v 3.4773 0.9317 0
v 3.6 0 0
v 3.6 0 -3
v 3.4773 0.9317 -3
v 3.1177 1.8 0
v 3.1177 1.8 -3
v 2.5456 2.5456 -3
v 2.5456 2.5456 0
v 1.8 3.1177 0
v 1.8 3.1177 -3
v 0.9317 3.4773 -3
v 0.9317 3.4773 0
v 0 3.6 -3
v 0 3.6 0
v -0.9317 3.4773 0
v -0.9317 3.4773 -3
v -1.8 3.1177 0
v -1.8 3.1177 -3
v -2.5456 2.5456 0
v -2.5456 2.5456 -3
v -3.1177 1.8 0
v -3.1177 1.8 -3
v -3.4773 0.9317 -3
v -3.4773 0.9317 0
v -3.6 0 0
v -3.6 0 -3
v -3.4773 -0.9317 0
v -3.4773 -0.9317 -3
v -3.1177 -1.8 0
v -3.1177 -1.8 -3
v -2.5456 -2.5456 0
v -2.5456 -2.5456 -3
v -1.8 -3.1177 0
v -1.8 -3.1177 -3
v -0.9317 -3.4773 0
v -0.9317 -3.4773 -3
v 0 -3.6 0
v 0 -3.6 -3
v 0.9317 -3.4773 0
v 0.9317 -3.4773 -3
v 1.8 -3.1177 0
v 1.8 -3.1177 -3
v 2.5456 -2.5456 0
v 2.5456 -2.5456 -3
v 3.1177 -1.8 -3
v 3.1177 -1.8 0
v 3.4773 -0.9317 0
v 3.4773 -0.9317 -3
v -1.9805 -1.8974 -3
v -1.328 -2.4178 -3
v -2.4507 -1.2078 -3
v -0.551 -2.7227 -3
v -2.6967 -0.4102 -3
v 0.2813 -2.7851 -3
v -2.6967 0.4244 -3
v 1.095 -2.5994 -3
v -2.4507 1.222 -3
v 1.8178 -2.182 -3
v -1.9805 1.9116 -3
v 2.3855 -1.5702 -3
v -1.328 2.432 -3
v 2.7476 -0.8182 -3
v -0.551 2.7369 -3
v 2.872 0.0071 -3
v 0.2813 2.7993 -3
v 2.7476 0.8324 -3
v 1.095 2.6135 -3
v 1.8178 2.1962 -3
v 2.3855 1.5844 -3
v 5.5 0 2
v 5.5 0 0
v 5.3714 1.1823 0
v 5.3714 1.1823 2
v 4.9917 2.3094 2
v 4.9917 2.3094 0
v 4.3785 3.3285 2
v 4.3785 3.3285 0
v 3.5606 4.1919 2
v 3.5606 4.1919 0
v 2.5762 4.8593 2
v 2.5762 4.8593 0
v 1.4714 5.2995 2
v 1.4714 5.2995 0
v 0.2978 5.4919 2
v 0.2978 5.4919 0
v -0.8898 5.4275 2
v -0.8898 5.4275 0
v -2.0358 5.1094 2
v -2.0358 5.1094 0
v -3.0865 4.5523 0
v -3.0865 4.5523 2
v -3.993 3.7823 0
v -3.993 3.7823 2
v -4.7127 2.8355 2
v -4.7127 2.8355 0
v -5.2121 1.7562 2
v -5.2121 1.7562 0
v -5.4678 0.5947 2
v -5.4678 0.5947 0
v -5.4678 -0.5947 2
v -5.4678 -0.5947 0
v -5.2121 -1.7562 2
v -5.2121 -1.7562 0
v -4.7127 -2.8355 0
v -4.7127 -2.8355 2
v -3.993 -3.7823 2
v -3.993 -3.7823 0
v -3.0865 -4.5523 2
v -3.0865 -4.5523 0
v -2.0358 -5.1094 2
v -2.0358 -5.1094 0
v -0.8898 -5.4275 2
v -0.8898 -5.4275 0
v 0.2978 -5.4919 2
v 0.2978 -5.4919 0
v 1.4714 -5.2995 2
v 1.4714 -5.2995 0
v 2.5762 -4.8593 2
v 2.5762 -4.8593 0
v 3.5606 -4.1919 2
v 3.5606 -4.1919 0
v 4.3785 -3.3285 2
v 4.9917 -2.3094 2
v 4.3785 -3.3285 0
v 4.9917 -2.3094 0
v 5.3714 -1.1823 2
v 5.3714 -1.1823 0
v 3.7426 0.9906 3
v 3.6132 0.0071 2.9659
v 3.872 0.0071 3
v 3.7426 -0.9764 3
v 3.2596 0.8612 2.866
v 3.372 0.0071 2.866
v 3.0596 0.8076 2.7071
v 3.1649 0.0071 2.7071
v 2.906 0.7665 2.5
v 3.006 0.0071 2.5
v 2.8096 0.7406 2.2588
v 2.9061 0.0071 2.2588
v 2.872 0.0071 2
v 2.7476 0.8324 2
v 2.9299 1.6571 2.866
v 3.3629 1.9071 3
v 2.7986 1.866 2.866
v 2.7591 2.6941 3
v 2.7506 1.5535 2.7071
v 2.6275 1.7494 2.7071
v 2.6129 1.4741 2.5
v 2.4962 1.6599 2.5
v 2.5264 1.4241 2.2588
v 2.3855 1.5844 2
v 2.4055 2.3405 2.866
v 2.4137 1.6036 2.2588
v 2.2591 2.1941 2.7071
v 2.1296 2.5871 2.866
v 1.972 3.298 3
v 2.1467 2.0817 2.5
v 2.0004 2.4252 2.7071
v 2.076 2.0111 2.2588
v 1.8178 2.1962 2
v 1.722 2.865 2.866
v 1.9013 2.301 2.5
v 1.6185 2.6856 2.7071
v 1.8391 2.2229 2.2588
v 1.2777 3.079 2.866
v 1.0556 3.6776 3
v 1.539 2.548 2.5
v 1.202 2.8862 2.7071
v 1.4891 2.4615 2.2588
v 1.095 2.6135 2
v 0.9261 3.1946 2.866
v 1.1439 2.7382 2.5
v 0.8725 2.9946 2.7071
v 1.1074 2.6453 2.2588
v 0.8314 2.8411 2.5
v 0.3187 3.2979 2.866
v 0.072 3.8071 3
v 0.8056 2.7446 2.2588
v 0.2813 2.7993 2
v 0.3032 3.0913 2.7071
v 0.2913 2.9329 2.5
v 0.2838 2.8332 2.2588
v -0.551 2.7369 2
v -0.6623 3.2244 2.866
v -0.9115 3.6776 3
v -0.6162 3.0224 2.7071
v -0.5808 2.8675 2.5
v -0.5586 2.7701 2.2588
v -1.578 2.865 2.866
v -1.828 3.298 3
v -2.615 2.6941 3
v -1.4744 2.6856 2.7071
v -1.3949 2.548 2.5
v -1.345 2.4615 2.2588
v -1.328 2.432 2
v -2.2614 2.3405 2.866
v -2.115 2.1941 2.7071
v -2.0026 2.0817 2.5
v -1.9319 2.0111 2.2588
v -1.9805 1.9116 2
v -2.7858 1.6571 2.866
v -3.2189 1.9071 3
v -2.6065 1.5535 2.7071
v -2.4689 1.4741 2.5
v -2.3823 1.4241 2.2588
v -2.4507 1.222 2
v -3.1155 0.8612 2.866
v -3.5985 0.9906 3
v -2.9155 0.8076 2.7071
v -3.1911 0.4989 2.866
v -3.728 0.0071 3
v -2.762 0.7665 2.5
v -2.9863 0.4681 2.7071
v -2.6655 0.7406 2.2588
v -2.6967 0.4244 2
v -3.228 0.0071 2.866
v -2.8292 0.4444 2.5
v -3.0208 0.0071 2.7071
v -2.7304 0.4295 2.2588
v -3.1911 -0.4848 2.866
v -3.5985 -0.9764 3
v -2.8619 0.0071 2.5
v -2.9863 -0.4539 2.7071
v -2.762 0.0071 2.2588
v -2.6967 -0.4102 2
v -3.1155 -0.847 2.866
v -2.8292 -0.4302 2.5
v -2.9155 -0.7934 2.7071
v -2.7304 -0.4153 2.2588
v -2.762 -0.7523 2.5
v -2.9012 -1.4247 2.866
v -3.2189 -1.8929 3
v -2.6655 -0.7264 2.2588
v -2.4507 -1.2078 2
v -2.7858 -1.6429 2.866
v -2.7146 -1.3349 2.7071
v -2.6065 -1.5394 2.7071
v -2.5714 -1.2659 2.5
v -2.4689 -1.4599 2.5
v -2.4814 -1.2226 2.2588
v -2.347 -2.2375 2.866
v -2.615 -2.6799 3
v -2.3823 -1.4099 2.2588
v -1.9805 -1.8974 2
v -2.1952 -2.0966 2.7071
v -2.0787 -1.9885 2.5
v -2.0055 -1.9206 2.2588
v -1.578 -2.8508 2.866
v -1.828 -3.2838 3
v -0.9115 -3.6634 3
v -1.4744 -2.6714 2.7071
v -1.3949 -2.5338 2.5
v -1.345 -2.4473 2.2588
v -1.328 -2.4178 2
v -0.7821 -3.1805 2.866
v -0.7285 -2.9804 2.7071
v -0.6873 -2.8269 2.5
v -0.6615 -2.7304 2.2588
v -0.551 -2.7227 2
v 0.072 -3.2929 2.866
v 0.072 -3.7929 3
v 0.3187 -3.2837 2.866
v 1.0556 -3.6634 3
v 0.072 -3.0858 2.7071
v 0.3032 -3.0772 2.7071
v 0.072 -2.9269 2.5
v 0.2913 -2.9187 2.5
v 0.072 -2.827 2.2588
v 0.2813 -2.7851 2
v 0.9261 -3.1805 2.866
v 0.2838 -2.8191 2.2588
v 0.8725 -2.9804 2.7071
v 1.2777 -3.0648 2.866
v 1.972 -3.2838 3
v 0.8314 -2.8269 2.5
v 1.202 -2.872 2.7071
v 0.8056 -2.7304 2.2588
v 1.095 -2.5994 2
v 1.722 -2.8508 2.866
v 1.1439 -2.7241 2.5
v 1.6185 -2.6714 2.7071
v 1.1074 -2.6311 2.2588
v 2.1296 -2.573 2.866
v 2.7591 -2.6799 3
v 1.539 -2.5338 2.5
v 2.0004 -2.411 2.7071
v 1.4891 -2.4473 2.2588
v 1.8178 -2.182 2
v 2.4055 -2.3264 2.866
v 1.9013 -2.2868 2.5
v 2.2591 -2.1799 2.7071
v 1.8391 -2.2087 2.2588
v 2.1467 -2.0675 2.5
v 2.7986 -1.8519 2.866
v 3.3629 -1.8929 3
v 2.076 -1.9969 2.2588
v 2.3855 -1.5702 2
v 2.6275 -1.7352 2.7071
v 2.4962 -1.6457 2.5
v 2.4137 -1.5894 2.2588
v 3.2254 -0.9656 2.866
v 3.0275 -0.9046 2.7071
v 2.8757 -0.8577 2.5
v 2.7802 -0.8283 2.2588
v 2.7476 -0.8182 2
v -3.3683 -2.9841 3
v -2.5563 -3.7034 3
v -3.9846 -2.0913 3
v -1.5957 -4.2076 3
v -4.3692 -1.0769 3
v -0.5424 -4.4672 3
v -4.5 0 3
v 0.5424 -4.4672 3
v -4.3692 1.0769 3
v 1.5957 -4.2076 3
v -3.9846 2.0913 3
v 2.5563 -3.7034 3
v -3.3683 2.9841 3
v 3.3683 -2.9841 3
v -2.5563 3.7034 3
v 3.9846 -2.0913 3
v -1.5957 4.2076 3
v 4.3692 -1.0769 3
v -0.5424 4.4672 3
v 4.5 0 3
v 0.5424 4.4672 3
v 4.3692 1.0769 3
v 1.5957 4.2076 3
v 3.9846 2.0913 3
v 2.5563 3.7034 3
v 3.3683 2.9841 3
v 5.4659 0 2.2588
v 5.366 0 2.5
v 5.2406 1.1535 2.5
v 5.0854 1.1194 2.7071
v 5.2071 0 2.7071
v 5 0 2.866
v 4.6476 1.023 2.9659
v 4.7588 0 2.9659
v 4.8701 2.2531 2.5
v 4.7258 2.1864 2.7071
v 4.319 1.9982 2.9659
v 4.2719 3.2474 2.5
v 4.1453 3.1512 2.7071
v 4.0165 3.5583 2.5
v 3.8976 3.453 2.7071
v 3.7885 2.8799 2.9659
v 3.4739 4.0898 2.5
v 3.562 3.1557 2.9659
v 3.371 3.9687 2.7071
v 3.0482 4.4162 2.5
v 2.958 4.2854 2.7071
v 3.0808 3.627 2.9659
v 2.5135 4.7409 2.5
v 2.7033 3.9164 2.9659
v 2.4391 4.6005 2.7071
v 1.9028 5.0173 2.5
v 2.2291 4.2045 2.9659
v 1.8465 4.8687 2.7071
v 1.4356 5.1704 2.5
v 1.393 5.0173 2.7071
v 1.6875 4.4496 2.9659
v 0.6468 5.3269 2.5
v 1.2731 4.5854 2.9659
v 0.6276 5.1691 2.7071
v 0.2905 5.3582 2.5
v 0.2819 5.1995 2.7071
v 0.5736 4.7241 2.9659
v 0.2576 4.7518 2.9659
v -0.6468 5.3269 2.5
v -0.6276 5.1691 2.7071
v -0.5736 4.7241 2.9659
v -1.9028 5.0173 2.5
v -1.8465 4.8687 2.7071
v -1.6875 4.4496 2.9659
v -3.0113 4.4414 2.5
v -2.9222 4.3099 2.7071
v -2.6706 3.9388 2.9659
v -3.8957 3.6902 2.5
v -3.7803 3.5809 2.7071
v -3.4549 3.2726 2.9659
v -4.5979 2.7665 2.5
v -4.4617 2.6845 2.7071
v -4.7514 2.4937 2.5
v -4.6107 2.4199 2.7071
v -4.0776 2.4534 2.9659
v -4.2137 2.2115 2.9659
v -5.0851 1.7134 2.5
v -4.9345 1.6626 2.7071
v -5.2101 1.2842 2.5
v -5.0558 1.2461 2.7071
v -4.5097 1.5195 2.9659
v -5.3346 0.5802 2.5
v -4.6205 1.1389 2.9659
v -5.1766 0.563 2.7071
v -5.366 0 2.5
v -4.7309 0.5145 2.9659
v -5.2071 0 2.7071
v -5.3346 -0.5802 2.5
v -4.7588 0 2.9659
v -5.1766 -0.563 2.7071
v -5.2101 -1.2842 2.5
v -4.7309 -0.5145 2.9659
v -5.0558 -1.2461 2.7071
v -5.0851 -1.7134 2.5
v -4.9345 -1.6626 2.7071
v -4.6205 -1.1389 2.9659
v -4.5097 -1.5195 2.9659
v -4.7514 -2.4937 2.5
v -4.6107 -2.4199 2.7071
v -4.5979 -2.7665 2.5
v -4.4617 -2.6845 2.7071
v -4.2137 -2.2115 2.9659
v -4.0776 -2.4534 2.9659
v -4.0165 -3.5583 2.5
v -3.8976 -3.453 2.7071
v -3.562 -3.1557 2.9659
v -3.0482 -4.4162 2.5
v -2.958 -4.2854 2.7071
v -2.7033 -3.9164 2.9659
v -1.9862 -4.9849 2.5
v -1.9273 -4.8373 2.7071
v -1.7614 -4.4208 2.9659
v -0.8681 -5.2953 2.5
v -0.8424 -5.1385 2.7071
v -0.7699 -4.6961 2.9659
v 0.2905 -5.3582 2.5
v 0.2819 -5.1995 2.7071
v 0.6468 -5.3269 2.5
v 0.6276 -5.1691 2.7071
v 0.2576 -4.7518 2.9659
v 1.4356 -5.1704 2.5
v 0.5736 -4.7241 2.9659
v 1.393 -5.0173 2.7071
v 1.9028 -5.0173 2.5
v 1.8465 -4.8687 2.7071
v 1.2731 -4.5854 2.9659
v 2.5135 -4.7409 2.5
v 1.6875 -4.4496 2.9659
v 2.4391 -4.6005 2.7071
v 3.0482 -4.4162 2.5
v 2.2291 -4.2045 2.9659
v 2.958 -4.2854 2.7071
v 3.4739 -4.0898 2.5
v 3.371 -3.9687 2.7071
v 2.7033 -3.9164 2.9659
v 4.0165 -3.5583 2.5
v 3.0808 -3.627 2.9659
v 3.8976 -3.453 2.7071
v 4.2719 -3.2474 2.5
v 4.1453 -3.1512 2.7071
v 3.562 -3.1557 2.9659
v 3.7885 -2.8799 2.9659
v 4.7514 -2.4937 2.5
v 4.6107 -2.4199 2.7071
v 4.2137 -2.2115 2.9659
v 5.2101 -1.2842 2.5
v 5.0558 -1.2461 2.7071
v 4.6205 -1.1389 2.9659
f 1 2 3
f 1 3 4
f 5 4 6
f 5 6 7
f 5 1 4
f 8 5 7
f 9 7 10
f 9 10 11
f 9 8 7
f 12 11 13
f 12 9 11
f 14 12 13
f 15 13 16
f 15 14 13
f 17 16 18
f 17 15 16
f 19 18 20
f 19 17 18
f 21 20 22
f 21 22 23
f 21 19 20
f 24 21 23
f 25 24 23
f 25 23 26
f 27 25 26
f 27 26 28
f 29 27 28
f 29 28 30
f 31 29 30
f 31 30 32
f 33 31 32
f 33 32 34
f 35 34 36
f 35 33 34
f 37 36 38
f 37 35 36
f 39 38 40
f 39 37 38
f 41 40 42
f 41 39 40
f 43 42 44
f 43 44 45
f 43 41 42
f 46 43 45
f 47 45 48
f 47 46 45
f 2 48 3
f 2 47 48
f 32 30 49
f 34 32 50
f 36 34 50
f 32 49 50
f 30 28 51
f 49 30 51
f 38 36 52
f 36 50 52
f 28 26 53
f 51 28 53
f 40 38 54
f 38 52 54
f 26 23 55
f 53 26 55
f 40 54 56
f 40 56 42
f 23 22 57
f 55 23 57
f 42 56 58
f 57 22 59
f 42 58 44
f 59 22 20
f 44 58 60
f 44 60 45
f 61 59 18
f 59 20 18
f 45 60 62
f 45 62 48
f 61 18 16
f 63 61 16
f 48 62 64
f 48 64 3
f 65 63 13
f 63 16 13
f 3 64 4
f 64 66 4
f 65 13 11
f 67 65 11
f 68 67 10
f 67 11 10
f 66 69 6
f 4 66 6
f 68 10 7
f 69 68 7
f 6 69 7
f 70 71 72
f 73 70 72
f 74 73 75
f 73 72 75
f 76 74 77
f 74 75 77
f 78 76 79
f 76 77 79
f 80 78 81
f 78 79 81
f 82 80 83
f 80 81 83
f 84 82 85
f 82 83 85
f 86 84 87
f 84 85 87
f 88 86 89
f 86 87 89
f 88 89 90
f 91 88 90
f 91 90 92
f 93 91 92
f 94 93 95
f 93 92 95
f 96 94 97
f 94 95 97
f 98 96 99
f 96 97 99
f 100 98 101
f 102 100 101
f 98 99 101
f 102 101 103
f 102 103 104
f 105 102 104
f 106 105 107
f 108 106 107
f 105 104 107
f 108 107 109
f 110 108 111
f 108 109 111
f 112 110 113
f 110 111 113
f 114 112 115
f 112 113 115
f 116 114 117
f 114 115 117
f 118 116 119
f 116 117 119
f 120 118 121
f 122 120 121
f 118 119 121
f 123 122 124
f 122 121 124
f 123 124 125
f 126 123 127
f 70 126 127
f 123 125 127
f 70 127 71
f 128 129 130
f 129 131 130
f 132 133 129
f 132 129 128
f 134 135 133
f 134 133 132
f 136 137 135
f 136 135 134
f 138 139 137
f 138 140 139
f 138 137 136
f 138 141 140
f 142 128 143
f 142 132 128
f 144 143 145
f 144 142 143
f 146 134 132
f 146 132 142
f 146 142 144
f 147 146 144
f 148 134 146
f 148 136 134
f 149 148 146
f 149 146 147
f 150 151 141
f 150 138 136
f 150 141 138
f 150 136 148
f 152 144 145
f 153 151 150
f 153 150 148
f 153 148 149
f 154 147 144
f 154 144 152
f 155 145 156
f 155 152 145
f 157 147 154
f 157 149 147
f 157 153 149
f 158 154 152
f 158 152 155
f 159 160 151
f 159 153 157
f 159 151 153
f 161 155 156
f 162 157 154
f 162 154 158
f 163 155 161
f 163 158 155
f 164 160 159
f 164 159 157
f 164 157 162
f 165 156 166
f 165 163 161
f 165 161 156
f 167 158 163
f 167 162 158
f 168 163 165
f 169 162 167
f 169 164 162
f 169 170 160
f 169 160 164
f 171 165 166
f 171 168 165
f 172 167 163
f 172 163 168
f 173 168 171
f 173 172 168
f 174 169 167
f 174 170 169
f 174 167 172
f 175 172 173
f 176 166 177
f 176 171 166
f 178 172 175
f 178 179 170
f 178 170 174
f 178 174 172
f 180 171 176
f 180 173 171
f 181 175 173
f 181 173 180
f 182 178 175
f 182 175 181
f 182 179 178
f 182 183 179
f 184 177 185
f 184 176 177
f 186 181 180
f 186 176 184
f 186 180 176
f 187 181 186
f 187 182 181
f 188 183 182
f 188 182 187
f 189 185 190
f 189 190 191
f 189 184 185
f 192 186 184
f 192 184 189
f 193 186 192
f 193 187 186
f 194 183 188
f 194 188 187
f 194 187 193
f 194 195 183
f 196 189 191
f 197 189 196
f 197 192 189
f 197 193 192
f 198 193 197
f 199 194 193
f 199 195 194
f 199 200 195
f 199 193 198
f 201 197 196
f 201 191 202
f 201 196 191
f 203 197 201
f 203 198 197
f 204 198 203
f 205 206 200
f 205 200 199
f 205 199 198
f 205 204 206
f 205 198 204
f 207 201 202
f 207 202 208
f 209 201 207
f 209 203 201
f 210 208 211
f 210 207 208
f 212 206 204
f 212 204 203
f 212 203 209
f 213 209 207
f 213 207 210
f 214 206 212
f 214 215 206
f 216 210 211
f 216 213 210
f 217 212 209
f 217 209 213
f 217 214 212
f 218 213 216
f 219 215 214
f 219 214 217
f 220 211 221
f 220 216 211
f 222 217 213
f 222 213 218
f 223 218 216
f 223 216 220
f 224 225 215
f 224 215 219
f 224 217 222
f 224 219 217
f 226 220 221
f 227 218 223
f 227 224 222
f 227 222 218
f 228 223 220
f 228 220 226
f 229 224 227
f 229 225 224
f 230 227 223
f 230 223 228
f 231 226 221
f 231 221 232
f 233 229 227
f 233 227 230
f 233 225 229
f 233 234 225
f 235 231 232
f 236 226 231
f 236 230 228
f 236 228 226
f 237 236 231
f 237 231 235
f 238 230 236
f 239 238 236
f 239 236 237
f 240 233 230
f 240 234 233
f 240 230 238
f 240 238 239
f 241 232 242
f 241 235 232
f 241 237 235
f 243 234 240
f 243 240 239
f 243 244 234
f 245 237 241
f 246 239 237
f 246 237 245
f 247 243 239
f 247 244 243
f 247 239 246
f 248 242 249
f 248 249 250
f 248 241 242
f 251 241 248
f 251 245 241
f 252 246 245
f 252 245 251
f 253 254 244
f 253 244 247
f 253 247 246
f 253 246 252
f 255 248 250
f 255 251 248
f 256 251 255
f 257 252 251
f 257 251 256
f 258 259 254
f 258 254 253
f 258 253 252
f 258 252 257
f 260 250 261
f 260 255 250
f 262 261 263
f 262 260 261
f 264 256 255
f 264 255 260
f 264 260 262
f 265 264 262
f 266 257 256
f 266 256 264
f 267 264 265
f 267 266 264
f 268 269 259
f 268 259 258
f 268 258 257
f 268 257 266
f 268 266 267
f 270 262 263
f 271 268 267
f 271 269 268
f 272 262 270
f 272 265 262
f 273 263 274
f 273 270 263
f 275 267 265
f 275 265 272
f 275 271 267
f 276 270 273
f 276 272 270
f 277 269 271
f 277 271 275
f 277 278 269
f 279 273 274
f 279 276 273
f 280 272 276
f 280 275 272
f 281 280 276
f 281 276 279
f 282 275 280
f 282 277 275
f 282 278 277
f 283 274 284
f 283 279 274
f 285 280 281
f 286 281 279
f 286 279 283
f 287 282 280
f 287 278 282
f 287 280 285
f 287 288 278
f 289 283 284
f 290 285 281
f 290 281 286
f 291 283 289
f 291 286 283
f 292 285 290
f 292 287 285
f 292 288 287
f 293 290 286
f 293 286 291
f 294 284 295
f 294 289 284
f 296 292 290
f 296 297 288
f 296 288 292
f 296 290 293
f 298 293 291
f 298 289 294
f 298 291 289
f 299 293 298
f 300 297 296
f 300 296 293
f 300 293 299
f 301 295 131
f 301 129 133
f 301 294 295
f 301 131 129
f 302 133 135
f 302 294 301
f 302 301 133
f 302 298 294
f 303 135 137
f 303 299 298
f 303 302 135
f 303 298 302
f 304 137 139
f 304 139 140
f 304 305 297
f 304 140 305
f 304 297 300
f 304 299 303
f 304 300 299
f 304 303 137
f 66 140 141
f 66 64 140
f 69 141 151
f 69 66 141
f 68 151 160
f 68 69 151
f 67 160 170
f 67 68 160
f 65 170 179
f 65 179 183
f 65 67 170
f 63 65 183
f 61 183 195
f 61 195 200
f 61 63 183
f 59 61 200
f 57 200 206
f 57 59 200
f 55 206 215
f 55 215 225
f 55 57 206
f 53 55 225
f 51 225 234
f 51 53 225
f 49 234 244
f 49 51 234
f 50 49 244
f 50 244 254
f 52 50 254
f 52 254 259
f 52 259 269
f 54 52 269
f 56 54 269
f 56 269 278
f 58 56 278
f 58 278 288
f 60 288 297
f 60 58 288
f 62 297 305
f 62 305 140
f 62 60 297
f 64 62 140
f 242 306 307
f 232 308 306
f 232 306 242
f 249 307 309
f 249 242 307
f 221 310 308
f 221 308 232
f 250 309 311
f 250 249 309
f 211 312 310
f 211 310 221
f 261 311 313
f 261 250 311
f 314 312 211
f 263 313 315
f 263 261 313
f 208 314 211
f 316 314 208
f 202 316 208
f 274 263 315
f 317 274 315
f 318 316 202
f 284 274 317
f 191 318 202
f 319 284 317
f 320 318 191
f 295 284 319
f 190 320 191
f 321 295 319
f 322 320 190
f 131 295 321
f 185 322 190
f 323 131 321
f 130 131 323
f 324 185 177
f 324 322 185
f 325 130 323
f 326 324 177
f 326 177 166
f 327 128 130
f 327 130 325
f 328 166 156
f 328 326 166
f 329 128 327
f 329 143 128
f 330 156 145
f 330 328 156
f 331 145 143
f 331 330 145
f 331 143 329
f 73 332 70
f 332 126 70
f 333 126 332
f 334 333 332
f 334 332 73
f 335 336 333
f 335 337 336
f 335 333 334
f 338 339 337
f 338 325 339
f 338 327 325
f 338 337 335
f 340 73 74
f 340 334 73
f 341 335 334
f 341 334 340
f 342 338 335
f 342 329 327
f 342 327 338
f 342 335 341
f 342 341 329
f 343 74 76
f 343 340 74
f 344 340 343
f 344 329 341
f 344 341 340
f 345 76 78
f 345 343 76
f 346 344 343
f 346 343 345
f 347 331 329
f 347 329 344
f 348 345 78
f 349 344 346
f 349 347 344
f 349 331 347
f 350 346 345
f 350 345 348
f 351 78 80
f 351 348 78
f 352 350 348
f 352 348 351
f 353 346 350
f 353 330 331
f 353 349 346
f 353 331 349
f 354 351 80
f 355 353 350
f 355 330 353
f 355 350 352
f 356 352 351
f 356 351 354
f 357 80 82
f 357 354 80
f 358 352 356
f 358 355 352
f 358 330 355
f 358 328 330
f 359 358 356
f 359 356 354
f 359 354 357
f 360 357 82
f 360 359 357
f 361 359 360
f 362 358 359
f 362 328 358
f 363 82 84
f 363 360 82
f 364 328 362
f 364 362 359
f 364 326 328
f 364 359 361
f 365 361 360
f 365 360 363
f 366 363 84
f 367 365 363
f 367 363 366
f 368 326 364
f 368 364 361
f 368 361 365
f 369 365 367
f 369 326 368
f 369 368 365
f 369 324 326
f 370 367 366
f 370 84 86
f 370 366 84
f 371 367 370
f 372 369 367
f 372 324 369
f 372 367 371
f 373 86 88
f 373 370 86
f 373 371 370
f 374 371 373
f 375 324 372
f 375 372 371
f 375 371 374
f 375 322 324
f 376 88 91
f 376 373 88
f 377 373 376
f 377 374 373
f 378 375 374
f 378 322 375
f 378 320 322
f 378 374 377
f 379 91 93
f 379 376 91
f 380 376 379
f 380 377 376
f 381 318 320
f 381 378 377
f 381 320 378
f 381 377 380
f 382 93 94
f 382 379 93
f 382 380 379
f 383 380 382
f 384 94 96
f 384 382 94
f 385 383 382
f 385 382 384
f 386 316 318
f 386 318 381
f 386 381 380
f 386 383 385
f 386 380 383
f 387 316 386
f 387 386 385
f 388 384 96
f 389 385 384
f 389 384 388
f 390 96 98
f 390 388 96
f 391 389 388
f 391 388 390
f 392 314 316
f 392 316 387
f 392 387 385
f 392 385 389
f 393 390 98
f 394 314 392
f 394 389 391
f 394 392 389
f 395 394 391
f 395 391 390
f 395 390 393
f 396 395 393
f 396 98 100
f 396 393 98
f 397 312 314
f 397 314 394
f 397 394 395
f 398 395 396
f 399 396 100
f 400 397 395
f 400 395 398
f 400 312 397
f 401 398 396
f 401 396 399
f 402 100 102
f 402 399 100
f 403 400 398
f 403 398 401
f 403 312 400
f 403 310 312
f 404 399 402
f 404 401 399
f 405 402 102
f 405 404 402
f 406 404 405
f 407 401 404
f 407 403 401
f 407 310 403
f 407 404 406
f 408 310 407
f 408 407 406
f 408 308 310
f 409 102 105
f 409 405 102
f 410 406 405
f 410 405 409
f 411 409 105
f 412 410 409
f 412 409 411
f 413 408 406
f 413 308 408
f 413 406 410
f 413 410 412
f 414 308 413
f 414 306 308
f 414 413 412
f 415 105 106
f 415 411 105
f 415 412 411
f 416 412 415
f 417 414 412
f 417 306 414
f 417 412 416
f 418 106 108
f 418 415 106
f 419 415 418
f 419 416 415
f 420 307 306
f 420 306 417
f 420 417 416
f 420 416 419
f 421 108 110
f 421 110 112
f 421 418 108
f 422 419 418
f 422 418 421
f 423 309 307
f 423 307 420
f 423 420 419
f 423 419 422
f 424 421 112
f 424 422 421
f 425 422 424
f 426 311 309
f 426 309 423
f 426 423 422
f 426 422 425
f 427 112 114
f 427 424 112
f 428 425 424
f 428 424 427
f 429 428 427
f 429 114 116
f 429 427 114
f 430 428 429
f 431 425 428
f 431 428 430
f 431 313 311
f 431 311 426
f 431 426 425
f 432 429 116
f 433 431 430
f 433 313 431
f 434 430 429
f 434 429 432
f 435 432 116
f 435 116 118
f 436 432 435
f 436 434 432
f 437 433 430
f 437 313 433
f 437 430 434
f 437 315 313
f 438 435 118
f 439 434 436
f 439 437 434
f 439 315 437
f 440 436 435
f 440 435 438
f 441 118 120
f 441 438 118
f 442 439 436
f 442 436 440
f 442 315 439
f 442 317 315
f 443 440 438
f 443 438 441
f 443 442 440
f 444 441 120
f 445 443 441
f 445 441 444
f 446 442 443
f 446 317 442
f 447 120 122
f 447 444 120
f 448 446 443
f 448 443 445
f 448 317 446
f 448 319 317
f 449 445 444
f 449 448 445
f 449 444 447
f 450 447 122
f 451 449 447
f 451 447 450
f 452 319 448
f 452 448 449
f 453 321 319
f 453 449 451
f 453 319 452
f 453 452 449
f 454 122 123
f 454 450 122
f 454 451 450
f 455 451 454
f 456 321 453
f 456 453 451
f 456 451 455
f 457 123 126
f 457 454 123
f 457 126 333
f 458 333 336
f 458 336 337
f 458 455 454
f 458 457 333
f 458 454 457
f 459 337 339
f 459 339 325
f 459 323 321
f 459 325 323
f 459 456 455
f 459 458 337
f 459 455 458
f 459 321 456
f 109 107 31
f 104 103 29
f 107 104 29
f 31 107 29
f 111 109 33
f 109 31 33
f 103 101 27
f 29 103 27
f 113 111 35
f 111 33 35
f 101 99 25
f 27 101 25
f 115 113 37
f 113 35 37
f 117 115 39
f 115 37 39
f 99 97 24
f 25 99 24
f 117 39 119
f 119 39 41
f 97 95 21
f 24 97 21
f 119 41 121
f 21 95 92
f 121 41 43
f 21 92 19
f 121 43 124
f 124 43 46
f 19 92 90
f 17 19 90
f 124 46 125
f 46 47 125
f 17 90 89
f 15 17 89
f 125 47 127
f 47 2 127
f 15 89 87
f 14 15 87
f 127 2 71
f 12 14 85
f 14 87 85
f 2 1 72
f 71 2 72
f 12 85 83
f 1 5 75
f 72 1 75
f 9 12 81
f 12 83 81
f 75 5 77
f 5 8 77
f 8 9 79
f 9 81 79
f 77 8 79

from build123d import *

# Parameters (mm, degrees)
F0_R     = 5.5
F0_R_2   = 3.6
F0_R_3   = 2.8
F1_DEPTH = 3
F2_DEPTH = 3
F3_R     = 1


with BuildPart() as f1:
    # F0 (on Top) → F1 (new body)
    with BuildSketch(Plane.XY):
        Circle(F0_R)
        Circle(F0_R_2, mode=Mode.SUBTRACT)
        Circle(F0_R_2)
        with Locations((0.072045, 0.007089)):
            Circle(F0_R_3, mode=Mode.SUBTRACT)
    extrude(amount=F1_DEPTH)

    # F0 (on Top) → F2 (join)
    with BuildSketch(Plane.XY):
        Circle(F0_R_2)
        with Locations((0.072045, 0.007089)):
            Circle(F0_R_3, mode=Mode.SUBTRACT)
    extrude(amount=-F2_DEPTH)

    # F3
    f3_edges = [f1.edges().sort_by_distance(p)[0] for p in [
        (-2.727955, 0.007089, 3),
        (-5.5, 0, 3),
    ]]
    fillet(f3_edges, radius=F3_R)


solid = f1.part
